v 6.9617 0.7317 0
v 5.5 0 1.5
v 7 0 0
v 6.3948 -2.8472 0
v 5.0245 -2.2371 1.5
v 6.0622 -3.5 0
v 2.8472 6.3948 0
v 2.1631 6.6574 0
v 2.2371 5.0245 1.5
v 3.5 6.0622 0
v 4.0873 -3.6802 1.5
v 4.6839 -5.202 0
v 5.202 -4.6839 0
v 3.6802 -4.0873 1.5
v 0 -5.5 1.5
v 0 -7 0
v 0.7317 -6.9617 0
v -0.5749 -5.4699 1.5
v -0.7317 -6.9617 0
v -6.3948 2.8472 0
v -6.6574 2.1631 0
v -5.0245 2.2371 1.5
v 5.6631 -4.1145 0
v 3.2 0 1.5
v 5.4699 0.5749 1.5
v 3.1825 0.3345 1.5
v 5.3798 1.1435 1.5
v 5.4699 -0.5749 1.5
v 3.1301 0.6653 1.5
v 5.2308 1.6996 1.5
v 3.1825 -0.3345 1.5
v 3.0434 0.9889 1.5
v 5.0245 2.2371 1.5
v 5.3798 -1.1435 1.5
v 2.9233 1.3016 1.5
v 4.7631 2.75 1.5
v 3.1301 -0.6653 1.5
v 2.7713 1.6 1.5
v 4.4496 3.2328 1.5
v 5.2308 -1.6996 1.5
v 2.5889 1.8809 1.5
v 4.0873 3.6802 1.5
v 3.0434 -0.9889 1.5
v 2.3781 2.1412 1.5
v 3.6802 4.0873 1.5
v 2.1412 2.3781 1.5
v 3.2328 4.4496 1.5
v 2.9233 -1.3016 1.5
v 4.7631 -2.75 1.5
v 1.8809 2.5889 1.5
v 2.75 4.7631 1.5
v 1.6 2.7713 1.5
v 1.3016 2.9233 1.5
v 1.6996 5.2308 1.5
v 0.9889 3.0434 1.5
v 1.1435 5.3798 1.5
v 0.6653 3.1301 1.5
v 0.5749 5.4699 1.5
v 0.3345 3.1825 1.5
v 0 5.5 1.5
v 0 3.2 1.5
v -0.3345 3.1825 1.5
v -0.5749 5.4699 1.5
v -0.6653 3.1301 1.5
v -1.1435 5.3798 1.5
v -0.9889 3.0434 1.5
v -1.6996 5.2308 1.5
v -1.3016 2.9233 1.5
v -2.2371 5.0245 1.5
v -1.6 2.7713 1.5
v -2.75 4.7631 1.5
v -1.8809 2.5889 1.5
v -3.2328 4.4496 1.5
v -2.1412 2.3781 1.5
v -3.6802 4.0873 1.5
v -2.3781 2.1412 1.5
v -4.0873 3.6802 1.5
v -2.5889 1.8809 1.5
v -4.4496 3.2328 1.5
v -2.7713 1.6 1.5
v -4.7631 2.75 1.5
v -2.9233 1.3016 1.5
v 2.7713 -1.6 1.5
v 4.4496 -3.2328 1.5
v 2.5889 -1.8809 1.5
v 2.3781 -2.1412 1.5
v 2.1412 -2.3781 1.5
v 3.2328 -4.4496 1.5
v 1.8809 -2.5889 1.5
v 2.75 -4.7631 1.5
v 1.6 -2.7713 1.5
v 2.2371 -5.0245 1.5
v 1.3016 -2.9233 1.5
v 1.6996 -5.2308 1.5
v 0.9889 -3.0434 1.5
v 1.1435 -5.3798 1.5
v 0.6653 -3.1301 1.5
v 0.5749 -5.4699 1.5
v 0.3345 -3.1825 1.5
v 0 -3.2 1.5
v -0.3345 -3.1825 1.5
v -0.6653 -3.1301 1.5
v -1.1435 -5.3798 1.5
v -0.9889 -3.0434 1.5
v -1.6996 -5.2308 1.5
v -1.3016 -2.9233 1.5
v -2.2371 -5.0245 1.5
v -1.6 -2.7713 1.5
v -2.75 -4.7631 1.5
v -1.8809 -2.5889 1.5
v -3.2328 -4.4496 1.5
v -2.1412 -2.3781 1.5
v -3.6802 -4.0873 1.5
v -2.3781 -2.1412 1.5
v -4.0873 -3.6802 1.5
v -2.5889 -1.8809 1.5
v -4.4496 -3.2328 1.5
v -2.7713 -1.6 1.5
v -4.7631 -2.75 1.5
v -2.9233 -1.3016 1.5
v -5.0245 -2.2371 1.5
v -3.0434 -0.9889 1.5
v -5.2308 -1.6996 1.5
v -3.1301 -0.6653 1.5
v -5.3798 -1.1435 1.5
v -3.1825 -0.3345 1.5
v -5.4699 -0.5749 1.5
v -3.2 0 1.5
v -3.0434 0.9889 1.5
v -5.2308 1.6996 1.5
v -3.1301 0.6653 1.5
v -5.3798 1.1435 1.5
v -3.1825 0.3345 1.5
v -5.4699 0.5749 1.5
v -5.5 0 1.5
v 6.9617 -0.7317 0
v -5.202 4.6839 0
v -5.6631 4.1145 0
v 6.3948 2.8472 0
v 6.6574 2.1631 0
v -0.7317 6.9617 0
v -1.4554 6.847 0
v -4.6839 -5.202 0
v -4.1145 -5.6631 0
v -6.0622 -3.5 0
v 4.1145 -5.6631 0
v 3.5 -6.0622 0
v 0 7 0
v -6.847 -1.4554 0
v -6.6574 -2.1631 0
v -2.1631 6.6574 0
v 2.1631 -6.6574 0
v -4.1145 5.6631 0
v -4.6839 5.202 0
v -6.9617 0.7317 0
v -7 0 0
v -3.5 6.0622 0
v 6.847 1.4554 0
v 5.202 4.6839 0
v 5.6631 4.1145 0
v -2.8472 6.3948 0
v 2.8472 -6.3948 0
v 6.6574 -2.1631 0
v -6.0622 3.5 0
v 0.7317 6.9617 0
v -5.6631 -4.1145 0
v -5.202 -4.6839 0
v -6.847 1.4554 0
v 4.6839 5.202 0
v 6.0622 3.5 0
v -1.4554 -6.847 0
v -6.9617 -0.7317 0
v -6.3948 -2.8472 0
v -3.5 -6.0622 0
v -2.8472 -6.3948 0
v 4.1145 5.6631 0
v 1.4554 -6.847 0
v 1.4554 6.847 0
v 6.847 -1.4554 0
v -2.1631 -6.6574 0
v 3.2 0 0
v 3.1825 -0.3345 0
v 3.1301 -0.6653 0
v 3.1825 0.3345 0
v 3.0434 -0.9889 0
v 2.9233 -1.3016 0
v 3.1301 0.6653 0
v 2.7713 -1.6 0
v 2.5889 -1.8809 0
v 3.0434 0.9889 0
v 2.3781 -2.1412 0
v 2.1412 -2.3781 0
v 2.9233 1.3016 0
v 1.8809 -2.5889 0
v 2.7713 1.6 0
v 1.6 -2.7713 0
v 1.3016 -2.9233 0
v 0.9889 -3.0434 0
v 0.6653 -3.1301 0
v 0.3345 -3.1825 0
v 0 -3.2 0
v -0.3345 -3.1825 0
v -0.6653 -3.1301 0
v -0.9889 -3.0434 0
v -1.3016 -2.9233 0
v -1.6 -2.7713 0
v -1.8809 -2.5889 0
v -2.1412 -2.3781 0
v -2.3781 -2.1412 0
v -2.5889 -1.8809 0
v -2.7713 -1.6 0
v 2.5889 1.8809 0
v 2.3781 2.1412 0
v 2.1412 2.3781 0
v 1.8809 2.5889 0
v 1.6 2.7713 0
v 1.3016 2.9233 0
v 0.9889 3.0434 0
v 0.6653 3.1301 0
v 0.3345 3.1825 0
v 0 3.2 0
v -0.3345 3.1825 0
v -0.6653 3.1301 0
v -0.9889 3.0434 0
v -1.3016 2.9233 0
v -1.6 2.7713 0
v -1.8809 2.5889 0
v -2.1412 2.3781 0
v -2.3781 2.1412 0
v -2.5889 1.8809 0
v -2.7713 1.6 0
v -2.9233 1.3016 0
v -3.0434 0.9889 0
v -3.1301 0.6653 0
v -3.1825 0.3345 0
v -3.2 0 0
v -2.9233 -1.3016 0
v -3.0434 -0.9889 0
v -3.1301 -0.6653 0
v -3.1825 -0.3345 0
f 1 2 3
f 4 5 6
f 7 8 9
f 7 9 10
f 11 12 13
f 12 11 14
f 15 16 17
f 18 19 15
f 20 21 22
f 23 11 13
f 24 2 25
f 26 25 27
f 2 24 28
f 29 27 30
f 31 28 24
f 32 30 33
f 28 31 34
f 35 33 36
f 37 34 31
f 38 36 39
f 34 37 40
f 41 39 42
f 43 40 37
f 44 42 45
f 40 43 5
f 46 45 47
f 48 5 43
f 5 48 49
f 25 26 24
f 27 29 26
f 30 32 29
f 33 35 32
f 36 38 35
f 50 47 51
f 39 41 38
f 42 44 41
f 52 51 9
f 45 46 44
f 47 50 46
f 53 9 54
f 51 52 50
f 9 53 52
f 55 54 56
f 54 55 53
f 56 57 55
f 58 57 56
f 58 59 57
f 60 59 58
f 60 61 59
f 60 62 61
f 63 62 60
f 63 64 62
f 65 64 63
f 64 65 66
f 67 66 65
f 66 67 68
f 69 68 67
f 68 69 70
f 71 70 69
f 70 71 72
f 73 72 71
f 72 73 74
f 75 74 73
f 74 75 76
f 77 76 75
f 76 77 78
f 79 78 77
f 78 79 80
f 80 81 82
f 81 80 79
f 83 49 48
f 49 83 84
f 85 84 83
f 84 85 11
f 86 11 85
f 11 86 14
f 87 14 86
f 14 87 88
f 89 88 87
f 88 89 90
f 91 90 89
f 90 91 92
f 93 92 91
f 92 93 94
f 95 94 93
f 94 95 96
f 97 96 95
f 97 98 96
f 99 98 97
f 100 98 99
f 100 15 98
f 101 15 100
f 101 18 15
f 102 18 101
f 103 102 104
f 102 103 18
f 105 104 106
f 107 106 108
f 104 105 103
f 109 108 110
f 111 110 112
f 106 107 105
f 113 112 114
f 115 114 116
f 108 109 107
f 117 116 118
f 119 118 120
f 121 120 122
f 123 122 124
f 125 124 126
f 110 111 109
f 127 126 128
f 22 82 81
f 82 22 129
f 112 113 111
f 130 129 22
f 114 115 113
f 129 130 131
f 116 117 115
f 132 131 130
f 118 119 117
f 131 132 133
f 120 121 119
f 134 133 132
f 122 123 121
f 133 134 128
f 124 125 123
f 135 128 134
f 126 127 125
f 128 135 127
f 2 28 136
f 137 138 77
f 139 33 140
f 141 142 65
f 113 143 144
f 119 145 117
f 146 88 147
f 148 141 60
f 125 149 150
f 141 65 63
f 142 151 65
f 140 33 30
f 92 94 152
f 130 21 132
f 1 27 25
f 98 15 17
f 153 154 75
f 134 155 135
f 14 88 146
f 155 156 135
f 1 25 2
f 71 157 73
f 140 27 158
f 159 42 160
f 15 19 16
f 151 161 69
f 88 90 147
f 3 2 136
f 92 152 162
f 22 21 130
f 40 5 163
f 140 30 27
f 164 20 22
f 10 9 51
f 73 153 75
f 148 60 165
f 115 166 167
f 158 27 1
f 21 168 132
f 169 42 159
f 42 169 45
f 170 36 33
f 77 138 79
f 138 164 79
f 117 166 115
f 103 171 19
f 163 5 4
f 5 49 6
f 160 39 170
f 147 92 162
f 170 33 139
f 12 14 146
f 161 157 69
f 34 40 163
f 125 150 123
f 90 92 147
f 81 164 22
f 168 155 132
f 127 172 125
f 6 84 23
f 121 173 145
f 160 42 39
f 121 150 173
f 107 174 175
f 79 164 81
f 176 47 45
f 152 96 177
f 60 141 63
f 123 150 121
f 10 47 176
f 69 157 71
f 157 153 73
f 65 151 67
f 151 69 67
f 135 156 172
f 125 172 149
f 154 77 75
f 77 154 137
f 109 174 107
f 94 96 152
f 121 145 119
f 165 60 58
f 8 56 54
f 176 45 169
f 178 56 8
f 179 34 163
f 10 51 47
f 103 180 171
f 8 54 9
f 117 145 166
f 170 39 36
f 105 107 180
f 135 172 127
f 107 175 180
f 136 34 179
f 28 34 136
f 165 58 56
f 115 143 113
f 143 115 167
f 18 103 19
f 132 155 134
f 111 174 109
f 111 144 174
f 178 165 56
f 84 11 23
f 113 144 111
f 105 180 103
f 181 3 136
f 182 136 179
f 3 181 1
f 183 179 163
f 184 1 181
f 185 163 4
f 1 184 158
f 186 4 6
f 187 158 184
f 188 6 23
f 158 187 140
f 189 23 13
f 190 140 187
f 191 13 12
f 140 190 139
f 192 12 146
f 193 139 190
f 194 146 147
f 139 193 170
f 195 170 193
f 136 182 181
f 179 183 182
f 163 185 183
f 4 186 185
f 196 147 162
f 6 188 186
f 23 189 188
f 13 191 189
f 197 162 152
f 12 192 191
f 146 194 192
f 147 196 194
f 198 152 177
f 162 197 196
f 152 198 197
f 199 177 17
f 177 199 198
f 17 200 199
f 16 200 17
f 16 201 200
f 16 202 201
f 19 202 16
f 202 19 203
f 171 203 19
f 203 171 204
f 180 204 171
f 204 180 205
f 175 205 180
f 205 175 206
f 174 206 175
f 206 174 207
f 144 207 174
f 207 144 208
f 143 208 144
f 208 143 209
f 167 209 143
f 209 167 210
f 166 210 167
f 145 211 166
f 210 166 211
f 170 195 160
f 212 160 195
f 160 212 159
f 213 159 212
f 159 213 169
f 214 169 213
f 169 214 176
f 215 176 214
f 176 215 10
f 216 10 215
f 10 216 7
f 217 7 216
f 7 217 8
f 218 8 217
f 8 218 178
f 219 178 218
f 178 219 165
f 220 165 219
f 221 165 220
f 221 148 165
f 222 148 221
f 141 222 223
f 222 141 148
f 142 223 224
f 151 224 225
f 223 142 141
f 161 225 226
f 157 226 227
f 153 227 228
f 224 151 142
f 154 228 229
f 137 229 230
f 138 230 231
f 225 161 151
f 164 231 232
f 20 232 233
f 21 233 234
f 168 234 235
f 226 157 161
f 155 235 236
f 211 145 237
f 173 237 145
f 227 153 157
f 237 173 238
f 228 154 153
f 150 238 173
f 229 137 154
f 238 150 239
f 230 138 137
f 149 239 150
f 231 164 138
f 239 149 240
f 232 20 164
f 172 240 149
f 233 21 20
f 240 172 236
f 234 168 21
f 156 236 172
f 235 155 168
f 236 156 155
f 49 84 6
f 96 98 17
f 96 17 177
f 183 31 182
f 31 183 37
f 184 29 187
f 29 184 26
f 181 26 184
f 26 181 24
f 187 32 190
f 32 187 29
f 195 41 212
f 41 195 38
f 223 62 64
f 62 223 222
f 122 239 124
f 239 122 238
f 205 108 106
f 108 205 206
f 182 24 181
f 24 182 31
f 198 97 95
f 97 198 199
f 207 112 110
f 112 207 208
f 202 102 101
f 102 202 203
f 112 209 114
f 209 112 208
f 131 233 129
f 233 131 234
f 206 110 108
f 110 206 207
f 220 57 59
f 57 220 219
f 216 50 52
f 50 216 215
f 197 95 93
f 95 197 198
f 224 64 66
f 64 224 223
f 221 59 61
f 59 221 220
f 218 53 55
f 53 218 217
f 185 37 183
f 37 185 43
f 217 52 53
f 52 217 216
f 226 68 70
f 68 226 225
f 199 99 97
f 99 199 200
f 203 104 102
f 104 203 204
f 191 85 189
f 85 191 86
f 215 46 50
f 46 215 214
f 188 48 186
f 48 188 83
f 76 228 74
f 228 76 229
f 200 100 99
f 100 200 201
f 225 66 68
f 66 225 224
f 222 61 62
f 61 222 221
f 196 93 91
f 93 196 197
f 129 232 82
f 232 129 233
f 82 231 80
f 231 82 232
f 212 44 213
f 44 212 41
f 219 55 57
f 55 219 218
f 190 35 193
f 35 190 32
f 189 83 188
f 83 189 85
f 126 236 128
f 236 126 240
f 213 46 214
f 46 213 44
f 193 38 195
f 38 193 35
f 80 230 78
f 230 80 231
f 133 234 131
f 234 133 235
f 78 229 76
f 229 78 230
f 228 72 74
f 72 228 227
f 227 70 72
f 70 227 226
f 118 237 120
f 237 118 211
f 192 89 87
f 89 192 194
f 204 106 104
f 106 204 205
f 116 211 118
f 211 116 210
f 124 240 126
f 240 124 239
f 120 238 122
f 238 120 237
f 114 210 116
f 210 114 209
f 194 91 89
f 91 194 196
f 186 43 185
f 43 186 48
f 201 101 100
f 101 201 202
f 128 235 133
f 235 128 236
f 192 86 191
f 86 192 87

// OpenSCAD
// Conical spring washer.
$fn = 60;
eps = 0.02;
inner_d = 6.4;
outer_d = 14;
thickness = 1.5;
difference() {
    cylinder(d1=outer_d,d2=outer_d-2*thickness,h=thickness);
    translate([0,0,-eps]) cylinder(d=inner_d,h=thickness+2*eps);
}
